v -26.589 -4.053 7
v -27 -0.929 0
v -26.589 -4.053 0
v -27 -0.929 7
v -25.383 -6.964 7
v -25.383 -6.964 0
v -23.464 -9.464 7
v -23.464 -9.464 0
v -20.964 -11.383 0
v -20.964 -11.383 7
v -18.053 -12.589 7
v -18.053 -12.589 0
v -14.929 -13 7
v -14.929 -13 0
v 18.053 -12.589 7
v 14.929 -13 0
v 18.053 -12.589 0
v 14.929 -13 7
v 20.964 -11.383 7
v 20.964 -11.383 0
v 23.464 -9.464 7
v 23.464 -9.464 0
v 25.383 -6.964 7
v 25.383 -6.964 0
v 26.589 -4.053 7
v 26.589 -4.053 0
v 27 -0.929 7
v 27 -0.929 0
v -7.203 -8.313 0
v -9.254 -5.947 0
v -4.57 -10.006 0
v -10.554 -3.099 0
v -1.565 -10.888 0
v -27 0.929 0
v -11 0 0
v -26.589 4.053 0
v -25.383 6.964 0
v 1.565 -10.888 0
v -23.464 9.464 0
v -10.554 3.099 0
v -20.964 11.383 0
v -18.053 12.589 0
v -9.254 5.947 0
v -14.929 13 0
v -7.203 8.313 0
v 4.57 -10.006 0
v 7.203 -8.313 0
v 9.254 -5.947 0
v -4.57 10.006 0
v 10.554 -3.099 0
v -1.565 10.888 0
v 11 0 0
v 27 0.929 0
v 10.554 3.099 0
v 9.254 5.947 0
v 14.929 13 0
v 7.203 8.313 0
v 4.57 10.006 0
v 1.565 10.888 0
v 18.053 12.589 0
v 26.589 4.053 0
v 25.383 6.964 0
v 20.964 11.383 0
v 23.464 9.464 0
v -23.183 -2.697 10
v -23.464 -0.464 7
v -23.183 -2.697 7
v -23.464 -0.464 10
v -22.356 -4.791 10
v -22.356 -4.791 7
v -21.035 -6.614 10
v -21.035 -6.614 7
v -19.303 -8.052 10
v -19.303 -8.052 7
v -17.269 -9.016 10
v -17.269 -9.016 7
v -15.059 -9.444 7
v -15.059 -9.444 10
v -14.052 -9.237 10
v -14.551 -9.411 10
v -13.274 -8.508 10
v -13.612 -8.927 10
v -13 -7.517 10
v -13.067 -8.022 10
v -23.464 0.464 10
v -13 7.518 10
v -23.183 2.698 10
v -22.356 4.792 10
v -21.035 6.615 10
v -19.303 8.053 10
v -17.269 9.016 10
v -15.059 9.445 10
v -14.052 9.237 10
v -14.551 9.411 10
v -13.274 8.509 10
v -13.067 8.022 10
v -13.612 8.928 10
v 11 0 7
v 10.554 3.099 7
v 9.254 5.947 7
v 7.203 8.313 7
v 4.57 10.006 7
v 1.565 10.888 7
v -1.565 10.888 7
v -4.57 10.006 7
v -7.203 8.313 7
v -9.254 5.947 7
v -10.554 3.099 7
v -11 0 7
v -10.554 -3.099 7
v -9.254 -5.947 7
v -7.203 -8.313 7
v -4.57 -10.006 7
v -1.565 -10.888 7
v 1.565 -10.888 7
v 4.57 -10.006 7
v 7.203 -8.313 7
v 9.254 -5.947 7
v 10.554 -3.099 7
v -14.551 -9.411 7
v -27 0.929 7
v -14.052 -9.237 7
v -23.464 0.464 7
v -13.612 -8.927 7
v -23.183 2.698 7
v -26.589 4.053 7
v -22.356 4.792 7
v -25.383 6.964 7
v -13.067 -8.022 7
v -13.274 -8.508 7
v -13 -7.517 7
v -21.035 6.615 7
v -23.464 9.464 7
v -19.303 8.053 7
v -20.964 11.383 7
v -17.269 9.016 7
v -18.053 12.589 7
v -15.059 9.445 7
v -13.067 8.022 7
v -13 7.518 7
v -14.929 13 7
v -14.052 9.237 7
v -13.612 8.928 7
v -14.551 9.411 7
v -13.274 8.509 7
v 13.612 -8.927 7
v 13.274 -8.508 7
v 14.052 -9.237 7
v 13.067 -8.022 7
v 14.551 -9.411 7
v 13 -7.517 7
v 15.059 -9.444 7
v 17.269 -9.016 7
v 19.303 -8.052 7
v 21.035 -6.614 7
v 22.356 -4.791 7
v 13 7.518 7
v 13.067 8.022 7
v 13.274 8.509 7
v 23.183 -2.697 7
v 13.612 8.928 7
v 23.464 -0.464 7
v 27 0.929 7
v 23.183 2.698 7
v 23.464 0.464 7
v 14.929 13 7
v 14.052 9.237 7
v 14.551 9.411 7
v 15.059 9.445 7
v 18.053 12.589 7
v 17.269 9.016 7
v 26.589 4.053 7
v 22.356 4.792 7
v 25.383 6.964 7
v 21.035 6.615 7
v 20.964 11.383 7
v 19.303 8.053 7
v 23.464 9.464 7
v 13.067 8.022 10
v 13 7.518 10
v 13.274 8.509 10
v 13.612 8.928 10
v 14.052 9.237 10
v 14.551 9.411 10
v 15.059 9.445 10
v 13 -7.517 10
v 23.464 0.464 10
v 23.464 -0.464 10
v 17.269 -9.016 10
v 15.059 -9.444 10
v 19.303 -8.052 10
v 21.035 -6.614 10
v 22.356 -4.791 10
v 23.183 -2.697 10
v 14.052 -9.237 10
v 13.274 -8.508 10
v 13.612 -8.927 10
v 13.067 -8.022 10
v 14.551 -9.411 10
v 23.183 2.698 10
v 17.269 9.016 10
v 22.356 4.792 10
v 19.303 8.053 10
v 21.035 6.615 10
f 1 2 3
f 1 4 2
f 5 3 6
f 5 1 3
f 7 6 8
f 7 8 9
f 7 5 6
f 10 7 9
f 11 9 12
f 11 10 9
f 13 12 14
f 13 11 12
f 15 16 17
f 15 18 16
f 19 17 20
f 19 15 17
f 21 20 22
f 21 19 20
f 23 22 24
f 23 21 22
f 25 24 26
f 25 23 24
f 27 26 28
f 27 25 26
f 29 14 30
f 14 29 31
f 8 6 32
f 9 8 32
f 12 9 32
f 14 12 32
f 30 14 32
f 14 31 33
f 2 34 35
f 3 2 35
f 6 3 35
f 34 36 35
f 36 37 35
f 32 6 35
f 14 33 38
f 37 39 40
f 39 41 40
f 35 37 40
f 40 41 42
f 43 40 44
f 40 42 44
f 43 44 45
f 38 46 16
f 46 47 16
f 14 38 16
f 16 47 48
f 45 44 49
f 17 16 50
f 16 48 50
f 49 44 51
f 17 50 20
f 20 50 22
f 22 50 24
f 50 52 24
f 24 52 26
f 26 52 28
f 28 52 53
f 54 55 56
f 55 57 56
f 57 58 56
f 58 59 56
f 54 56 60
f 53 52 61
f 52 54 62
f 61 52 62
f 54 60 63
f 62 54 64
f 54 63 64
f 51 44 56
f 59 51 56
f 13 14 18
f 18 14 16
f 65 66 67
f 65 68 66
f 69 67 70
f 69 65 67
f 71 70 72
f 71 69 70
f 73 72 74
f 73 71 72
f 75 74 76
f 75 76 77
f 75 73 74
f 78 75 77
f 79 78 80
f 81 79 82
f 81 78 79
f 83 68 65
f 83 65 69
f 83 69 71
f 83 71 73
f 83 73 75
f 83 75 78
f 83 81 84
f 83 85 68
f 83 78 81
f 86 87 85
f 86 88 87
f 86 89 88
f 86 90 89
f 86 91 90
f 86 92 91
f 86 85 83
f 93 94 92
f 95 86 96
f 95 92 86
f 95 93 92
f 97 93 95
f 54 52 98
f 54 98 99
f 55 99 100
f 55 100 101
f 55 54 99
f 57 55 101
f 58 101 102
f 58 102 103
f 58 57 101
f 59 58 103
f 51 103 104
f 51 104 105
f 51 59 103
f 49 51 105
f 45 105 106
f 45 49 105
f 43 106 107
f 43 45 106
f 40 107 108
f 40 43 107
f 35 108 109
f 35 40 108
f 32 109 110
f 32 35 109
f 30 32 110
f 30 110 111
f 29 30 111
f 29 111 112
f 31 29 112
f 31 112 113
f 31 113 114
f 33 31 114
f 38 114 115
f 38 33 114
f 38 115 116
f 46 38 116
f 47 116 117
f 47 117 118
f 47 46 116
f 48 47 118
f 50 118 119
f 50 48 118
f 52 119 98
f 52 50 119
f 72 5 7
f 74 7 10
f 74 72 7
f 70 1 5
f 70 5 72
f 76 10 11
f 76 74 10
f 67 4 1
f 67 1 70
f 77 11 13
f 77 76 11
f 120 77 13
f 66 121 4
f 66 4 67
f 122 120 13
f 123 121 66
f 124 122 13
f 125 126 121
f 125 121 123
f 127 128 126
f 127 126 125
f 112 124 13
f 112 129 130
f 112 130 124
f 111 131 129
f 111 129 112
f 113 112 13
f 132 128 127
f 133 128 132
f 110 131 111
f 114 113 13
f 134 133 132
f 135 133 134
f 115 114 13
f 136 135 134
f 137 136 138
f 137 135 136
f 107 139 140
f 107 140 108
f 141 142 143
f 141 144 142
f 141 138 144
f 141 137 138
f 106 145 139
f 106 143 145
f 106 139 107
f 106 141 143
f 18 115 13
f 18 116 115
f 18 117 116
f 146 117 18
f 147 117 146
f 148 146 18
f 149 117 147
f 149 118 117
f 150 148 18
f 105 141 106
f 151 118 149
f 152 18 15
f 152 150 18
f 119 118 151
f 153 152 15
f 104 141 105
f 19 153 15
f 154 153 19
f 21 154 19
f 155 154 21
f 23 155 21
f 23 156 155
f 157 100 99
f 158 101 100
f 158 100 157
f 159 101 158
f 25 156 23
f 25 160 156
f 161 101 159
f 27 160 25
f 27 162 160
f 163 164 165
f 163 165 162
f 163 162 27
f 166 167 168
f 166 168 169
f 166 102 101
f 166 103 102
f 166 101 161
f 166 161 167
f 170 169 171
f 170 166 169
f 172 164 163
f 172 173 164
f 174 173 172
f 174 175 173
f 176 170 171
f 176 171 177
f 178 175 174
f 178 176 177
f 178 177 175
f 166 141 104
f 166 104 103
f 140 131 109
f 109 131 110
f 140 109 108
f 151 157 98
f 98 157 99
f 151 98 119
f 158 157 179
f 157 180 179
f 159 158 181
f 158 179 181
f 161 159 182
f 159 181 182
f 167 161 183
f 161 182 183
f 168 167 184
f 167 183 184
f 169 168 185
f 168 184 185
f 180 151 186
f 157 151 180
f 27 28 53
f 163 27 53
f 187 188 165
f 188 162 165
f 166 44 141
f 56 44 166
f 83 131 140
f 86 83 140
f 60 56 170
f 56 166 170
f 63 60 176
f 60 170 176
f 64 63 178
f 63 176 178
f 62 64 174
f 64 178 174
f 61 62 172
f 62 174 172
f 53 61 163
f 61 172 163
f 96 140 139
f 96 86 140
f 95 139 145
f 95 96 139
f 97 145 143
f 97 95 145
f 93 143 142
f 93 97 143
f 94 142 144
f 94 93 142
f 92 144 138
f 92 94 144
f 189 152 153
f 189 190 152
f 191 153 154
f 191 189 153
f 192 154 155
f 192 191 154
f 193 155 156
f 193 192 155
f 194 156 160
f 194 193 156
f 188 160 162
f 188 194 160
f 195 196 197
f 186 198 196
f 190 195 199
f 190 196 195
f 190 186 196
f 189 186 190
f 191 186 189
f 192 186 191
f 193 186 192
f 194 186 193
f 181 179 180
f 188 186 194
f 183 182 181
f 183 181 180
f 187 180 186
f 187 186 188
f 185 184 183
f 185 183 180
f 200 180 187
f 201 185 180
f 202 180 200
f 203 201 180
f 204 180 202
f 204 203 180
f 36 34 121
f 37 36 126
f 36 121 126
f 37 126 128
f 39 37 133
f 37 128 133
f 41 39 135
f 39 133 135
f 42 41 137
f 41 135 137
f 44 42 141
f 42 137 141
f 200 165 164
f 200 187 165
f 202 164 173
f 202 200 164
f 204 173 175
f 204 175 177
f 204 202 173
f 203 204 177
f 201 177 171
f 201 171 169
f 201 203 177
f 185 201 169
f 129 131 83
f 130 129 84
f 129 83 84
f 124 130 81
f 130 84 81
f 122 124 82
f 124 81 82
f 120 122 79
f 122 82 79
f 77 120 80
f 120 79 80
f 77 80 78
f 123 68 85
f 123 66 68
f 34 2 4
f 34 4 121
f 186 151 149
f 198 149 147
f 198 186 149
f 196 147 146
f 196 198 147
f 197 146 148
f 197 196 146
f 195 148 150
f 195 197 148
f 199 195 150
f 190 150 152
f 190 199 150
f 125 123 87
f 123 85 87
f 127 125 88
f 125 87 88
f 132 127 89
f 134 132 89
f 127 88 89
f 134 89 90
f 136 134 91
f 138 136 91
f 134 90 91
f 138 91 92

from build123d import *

# Parameters (mm, degrees)
F0_W     = 54
F0_H     = 26
F0_R     = 11
F1_DEPTH = 7
F2_R     = 12.0710678119
F3_W     = 10.4644660941
F3_H     = 18.9284660941
F4_DEPTH = 3
F5_R     = 9
F6_DEPTH = 3
F7_R     = 9
F8_R     = 1.9313708499


with BuildPart() as f1:
    # F0 (on Top) → F1 (new body)
    with BuildSketch(Plane.XY):
        Rectangle(F0_W, F0_H)
        Circle(F0_R, mode=Mode.SUBTRACT)
    extrude(amount=F1_DEPTH)

    # F2
    f2_edges = [f1.edges().sort_by_distance(p)[0] for p in [
        (-27, -13, 3.5),
        (-27, 13, 3.5),
        (27, -13, 3.5),
        (27, 13, 3.5),
    ]]
    fillet(f2_edges, radius=F2_R)

    # F3 (on face) → F4 (join)
    with BuildSketch(Plane.XY.offset(7)):
        with Locations((-18.232233047, 0.000233047)):
            Rectangle(F3_W, F3_H)
        with Locations((18.232233047, 0.000233047)):
            Rectangle(F3_W, F3_H)
    extrude(amount=F4_DEPTH)

    # F5
    f5_edges = [f1.edges().sort_by_distance(p)[0] for p in [
        (-23.464466, -9.464, 8.5),
        (23.464466, -9.464, 8.5),
        (-23.464466, 9.464466, 8.5),
        (23.464466, 9.464466, 8.5),
    ]]
    fillet(f5_edges, radius=F5_R)

    # F3 (on face) → F6 (join)
    with BuildSketch(Plane.XY.offset(7)):
        with Locations((-18.232233047, 0.000233047)):
            Rectangle(F3_W, F3_H)
        with Locations((18.232233047, 0.000233047)):
            Rectangle(F3_W, F3_H)
    extrude(amount=F6_DEPTH)

    # F7
    f7_edges = [f1.edges().sort_by_distance(p)[0] for p in [
        (-23.464466, 9.464466, 8.5),
        (-23.464466, -9.464, 8.5),
        (23.464466, -9.464, 8.5),
        (23.464466, 9.464466, 8.5),
    ]]
    fillet(f7_edges, radius=F7_R)

    # F8
    f8_edges = [f1.edges().sort_by_distance(p)[0] for p in [
        (13, -9.464, 8.5),
        (13, 9.464466, 8.5),
        (-13, -9.464, 8.5),
        (-13, 9.464466, 8.5),
    ]]
    fillet(f8_edges, radius=F8_R)


solid = f1.part
